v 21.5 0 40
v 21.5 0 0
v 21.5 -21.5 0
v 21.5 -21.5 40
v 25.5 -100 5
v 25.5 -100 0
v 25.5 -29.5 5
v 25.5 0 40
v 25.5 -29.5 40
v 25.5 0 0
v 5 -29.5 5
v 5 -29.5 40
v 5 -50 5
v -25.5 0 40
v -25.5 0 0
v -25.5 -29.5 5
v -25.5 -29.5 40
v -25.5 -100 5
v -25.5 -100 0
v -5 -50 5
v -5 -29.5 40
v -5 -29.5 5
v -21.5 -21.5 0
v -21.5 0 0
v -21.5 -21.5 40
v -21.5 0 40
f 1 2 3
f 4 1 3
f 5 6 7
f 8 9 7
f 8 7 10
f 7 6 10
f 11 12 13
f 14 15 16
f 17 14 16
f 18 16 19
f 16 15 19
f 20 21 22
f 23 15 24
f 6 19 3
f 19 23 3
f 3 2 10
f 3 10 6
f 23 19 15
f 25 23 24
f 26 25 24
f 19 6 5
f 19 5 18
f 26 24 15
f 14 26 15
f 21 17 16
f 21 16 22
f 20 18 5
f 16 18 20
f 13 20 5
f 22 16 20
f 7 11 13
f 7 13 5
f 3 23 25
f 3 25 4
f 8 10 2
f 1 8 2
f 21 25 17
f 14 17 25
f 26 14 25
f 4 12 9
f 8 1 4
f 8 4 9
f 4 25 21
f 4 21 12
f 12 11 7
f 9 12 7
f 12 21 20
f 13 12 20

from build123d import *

# Parameters (mm, degrees)
EXTRUDE_1_DEPTH     = 5
EXTRUDE_2_DEPTH     = 5
CUT_EXTRUDE_2_DEPTH = 52
SKETCH_6_W          = 43
SKETCH_6_H          = 8
EXTRUDE_3_DEPTH     = 35
RIB_4_REACH         = 262.096
SKETCH_8_WALL_W     = 562.75395357
SKETCH_8_WALL_H     = 10
CUT_EXTRUDE_3_DEPTH = 35
SKETCH_10_W         = 141.906690428
SKETCH_10_H         = 100
CUT_EXTRUDE_4_DEPTH = 10


with BuildPart() as part:
    # 草图1 → 凸台-拉伸1 (new body)
    with BuildSketch(Plane.XY):
        with BuildLine():
            Line((167.406690428, -100), (0, -100))
            Line((0, -100), (-167.406690428, -100))
            ThreePointArc((-167.406690428, -100), (0, -195), (167.406690428, -100))
        make_face()
    extrude(amount=EXTRUDE_1_DEPTH)

    # 草图4 → 凸台-拉伸2 (add)
    with BuildSketch(Plane.XY.offset(5)):
        Polygon((167.406690428, 0), (0, 0), (0, -100), (21.5, -100), (167.406690428, -100), align=None)
        Polygon((0, -100), (0, 0), (-167.406690428, 0), (-167.406690428, -100), (-21.5, -100), align=None)
    extrude(amount=-EXTRUDE_2_DEPTH)

    # 草图5 → 切除-拉伸2 (cut)
    with BuildSketch(Plane.XY.offset(5)):
        Polygon((0, 0), (21.5, 0), (21.5, -21.5), (-21.5, -21.5), (-21.5, 0), align=None)
    extrude(amount=-CUT_EXTRUDE_2_DEPTH, mode=Mode.SUBTRACT)

    # 草图6 → 凸台-拉伸3 (add)
    with BuildSketch(Plane.XY.offset(5)):
        Polygon((-21.5, -29.5), (-21.5, -21.5), (-21.5, 0), (-25.5, 0), (-25.5, -29.5), align=None)
        with Locations((0, -25.5)):
            Rectangle(SKETCH_6_W, SKETCH_6_H)
        Polygon((21.5, 0), (21.5, -21.5), (21.5, -29.5), (25.5, -29.5), (25.5, 0), align=None)
    extrude(amount=EXTRUDE_3_DEPTH)

    # 草图8 wall → 筋4 (add, up to next)
    with BuildSketch(Plane(origin=(0, -39.75, 22.5), x_dir=(0, -0.505403111507, -0.862883361109), z_dir=(0, 0.862883361109, -0.505403111507)), mode=Mode.PRIVATE) as rib_4_sk1:
        Rectangle(SKETCH_8_WALL_W, SKETCH_8_WALL_H)
    rib_4_tool1 = extrude(rib_4_sk1.sketch, amount=RIB_4_REACH, mode=Mode.PRIVATE) - part.part
    add(rib_4_tool1.solids().sort_by_distance((0, -39.75, 22.5))[0])

    # 草图9 → 切除-拉伸3 (cut)
    with BuildSketch(Plane(origin=(0, 0, 0), x_dir=(-1, 0, 0), z_dir=(0, 0, -1))):
        Polygon((-167.406690428, -100), (167.406690428, -100), (167.406690428, -206.368717501), (-177.688477613, -206.368717501), align=None)
    extrude(amount=-CUT_EXTRUDE_3_DEPTH, mode=Mode.SUBTRACT)

    # 草图10 → 切除-拉伸4 (cut)
    with BuildSketch(Plane(origin=(0, 0, 0), x_dir=(-1, 0, 0), z_dir=(0, 0, -1))):
        with Locations((-96.453345214, -50)):
            Rectangle(SKETCH_10_W, SKETCH_10_H)
        with Locations((96.453345214, -50)):
            Rectangle(SKETCH_10_W, SKETCH_10_H)
    extrude(amount=-CUT_EXTRUDE_4_DEPTH, mode=Mode.SUBTRACT)


solid = part.part
